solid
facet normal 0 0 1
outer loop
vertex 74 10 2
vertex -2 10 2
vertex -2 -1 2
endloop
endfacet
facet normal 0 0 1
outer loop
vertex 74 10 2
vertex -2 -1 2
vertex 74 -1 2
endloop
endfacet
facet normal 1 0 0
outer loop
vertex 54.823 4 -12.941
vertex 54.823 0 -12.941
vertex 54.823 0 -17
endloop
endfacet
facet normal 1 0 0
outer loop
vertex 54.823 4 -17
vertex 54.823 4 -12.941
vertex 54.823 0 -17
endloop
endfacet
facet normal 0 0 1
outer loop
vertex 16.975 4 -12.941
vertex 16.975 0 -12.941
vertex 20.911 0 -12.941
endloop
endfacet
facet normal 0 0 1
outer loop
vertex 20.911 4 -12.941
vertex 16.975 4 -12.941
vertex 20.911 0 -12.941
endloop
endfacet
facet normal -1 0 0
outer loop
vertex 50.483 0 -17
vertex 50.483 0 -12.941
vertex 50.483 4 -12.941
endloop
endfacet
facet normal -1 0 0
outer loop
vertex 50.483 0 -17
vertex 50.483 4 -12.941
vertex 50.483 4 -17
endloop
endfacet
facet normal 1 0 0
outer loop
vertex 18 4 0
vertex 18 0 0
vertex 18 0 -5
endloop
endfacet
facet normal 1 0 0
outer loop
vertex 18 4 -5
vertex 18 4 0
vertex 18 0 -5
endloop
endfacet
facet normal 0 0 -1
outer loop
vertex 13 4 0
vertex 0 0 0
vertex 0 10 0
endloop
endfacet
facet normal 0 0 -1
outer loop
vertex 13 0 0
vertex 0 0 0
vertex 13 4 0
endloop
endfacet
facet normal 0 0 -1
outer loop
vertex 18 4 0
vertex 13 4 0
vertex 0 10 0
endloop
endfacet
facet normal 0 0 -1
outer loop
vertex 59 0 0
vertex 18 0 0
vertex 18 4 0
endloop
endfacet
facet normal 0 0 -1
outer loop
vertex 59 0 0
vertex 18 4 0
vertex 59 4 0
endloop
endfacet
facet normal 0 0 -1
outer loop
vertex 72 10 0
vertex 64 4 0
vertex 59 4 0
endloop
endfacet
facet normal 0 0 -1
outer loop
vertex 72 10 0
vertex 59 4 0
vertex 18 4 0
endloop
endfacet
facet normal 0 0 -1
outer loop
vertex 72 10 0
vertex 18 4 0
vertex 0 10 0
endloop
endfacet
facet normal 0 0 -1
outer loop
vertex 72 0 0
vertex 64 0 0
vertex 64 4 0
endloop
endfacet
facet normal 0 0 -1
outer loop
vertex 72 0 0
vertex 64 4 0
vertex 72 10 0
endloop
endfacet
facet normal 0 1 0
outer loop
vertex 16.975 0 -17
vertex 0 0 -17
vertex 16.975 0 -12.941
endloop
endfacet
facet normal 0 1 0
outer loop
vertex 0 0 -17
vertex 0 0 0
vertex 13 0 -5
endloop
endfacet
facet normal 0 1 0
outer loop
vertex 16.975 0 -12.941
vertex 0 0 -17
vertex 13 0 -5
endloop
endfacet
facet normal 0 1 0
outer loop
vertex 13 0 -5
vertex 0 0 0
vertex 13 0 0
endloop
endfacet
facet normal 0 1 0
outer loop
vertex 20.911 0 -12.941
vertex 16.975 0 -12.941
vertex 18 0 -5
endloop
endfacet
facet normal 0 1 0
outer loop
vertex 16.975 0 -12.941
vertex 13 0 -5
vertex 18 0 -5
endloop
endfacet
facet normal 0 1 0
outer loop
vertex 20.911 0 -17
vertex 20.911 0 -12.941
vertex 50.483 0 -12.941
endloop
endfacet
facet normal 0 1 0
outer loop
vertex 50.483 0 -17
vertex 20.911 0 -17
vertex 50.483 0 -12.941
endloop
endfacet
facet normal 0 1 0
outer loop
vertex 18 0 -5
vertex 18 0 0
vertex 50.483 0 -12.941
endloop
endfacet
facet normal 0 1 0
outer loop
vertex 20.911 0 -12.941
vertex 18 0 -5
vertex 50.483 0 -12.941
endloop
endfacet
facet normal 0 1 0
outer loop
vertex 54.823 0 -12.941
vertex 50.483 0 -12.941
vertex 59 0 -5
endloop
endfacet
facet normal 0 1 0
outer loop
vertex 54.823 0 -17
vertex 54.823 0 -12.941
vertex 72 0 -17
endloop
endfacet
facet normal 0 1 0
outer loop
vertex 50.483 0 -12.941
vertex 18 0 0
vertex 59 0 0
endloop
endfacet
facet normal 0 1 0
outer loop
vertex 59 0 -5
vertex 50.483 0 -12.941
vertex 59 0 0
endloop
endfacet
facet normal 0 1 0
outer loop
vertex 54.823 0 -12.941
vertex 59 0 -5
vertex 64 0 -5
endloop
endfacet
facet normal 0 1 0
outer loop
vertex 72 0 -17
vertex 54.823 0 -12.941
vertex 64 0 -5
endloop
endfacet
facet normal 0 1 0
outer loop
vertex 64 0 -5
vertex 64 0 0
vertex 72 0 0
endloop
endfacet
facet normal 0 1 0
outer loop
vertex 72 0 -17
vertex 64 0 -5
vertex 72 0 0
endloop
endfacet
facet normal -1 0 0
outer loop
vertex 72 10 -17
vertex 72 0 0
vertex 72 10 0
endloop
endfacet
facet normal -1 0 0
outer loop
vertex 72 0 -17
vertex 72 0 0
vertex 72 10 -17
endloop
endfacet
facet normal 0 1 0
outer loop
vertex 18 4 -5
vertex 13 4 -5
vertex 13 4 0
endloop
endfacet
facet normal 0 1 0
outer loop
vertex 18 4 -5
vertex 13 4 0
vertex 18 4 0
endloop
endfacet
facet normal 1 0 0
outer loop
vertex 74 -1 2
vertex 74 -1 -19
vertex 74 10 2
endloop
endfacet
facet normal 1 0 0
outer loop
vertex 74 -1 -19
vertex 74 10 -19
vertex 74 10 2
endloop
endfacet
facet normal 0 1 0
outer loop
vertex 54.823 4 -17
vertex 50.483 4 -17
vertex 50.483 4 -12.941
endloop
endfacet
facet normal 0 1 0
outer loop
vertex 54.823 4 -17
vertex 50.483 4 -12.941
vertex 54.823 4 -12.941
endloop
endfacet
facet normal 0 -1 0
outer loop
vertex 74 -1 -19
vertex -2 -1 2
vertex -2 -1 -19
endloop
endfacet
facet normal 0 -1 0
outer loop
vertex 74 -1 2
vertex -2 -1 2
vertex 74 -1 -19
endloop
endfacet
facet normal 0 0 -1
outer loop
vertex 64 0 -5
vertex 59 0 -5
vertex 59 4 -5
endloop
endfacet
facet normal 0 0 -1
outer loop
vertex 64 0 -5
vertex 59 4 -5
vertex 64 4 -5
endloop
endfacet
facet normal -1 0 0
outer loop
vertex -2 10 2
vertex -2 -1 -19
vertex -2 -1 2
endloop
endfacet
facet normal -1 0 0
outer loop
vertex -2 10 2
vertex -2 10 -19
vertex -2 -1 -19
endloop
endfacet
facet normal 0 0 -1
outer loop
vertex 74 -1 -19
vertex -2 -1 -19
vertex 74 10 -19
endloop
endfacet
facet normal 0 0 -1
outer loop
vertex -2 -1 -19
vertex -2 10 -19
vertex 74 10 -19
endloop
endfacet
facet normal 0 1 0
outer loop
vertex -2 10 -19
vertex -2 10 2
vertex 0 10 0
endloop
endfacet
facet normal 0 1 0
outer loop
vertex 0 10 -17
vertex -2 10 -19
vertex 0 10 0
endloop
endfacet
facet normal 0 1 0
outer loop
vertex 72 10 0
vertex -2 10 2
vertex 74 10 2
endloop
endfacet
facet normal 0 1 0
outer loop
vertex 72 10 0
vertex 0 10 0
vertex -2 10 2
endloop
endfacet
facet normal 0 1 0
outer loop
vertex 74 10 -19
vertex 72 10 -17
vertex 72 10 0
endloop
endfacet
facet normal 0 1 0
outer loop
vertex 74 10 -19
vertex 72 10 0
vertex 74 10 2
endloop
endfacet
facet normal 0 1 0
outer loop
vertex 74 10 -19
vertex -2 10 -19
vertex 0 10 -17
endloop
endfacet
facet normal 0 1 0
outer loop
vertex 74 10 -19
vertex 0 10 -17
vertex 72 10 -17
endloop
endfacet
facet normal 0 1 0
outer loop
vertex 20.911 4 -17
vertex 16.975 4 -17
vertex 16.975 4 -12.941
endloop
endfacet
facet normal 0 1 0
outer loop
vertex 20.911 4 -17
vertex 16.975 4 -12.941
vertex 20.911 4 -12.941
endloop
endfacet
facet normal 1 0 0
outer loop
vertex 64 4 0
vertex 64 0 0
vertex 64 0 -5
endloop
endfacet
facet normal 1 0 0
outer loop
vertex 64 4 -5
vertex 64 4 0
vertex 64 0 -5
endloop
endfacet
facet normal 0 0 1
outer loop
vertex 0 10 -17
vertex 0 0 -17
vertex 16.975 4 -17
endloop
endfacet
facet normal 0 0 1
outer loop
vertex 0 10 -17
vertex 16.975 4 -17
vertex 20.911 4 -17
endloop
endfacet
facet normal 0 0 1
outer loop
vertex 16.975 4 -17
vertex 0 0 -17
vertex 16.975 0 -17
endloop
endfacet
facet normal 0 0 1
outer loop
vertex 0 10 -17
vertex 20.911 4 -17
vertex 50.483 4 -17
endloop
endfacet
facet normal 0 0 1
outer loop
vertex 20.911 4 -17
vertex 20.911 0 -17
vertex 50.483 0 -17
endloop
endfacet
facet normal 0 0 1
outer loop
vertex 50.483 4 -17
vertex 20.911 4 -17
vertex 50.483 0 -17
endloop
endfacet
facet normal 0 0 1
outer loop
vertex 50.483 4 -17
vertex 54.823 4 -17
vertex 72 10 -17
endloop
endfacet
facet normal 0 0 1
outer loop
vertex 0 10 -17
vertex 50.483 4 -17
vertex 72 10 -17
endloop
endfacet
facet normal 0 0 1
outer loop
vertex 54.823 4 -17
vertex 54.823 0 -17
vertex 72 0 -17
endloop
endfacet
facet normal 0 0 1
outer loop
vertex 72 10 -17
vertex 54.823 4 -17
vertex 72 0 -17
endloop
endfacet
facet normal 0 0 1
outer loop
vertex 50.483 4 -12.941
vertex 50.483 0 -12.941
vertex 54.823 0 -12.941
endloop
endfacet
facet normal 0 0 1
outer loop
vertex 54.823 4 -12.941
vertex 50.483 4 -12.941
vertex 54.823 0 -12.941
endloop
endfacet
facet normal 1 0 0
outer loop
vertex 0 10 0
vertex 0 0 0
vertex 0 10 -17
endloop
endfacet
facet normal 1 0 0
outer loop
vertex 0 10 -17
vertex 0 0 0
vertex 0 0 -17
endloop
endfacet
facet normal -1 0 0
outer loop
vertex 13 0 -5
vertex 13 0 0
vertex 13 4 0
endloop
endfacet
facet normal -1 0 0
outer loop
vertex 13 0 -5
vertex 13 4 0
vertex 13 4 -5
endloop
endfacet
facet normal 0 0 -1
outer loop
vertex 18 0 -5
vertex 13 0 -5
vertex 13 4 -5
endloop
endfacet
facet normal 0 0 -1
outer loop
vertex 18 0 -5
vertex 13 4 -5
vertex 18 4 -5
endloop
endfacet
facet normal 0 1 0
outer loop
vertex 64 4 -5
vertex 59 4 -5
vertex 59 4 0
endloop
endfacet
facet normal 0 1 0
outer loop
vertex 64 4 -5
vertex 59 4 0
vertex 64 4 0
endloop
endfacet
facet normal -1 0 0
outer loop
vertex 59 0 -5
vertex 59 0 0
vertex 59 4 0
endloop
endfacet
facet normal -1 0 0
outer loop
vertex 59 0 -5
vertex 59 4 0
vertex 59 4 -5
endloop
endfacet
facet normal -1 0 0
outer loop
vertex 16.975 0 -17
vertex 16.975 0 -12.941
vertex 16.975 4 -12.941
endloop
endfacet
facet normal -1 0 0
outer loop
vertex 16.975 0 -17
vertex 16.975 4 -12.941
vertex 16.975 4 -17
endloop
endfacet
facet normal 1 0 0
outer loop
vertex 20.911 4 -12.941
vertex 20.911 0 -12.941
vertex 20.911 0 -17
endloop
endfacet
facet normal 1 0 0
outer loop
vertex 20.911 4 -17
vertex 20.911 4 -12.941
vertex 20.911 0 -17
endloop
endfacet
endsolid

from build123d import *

# Parameters (mm, degrees)
SKETCH1_W           = 76
SKETCH1_H           = 21
SKETCH1_W_2         = 72
SKETCH1_H_2         = 17
BOSS_EXTRUDE1_DEPTH = 10
SKETCH2_W           = 76
SKETCH2_H           = 21
BOSS_EXTRUDE2_DEPTH = 1
SKETCH3_W           = 3.936198622
SKETCH3_H           = 4.059160528
SKETCH3_W_2         = 4.339911302
BOSS_EXTRUDE3_DEPTH = 4
SKETCH4_W           = 5
SKETCH4_H           = 5
BOSS_EXTRUDE4_DEPTH = 4


with BuildPart() as part:
    # Sketch1 → Boss-Extrude1 (new body)
    with BuildSketch(Plane(origin=(0, 0, 0), x_dir=(1, 0, 0), z_dir=(0, 1, 0))):
        with Locations((36, 8.5)):
            Rectangle(SKETCH1_W, SKETCH1_H)
        with Locations((36, 8.5)):
            Rectangle(SKETCH1_W_2, SKETCH1_H_2, mode=Mode.SUBTRACT)
    extrude(amount=BOSS_EXTRUDE1_DEPTH)

    # Sketch2 → Boss-Extrude2 (add)
    with BuildSketch(Plane.XZ):
        with Locations((36, -8.5)):
            Rectangle(SKETCH2_W, SKETCH2_H)
    extrude(amount=BOSS_EXTRUDE2_DEPTH)

    # Sketch3 → Boss-Extrude3 (add)
    with BuildSketch(Plane(origin=(0, 0, 0), x_dir=(1, 0, 0), z_dir=(0, 1, 0))):
        with Locations((18.943139302, 14.970419736)):
            Rectangle(SKETCH3_W, SKETCH3_H)
        with Locations((52.653148019, 14.970419736)):
            Rectangle(SKETCH3_W_2, SKETCH3_H)
    extrude(amount=BOSS_EXTRUDE3_DEPTH)

    # Sketch4 → Boss-Extrude4 (add)
    with BuildSketch(Plane(origin=(0, 0, 0), x_dir=(1, 0, 0), z_dir=(0, 1, 0))):
        with Locations((15.5, 2.5)):
            Rectangle(SKETCH4_W, SKETCH4_H)
        with Locations((61.5, 2.5)):
            Rectangle(SKETCH4_W, SKETCH4_H)
    extrude(amount=BOSS_EXTRUDE4_DEPTH)


solid = part.part
